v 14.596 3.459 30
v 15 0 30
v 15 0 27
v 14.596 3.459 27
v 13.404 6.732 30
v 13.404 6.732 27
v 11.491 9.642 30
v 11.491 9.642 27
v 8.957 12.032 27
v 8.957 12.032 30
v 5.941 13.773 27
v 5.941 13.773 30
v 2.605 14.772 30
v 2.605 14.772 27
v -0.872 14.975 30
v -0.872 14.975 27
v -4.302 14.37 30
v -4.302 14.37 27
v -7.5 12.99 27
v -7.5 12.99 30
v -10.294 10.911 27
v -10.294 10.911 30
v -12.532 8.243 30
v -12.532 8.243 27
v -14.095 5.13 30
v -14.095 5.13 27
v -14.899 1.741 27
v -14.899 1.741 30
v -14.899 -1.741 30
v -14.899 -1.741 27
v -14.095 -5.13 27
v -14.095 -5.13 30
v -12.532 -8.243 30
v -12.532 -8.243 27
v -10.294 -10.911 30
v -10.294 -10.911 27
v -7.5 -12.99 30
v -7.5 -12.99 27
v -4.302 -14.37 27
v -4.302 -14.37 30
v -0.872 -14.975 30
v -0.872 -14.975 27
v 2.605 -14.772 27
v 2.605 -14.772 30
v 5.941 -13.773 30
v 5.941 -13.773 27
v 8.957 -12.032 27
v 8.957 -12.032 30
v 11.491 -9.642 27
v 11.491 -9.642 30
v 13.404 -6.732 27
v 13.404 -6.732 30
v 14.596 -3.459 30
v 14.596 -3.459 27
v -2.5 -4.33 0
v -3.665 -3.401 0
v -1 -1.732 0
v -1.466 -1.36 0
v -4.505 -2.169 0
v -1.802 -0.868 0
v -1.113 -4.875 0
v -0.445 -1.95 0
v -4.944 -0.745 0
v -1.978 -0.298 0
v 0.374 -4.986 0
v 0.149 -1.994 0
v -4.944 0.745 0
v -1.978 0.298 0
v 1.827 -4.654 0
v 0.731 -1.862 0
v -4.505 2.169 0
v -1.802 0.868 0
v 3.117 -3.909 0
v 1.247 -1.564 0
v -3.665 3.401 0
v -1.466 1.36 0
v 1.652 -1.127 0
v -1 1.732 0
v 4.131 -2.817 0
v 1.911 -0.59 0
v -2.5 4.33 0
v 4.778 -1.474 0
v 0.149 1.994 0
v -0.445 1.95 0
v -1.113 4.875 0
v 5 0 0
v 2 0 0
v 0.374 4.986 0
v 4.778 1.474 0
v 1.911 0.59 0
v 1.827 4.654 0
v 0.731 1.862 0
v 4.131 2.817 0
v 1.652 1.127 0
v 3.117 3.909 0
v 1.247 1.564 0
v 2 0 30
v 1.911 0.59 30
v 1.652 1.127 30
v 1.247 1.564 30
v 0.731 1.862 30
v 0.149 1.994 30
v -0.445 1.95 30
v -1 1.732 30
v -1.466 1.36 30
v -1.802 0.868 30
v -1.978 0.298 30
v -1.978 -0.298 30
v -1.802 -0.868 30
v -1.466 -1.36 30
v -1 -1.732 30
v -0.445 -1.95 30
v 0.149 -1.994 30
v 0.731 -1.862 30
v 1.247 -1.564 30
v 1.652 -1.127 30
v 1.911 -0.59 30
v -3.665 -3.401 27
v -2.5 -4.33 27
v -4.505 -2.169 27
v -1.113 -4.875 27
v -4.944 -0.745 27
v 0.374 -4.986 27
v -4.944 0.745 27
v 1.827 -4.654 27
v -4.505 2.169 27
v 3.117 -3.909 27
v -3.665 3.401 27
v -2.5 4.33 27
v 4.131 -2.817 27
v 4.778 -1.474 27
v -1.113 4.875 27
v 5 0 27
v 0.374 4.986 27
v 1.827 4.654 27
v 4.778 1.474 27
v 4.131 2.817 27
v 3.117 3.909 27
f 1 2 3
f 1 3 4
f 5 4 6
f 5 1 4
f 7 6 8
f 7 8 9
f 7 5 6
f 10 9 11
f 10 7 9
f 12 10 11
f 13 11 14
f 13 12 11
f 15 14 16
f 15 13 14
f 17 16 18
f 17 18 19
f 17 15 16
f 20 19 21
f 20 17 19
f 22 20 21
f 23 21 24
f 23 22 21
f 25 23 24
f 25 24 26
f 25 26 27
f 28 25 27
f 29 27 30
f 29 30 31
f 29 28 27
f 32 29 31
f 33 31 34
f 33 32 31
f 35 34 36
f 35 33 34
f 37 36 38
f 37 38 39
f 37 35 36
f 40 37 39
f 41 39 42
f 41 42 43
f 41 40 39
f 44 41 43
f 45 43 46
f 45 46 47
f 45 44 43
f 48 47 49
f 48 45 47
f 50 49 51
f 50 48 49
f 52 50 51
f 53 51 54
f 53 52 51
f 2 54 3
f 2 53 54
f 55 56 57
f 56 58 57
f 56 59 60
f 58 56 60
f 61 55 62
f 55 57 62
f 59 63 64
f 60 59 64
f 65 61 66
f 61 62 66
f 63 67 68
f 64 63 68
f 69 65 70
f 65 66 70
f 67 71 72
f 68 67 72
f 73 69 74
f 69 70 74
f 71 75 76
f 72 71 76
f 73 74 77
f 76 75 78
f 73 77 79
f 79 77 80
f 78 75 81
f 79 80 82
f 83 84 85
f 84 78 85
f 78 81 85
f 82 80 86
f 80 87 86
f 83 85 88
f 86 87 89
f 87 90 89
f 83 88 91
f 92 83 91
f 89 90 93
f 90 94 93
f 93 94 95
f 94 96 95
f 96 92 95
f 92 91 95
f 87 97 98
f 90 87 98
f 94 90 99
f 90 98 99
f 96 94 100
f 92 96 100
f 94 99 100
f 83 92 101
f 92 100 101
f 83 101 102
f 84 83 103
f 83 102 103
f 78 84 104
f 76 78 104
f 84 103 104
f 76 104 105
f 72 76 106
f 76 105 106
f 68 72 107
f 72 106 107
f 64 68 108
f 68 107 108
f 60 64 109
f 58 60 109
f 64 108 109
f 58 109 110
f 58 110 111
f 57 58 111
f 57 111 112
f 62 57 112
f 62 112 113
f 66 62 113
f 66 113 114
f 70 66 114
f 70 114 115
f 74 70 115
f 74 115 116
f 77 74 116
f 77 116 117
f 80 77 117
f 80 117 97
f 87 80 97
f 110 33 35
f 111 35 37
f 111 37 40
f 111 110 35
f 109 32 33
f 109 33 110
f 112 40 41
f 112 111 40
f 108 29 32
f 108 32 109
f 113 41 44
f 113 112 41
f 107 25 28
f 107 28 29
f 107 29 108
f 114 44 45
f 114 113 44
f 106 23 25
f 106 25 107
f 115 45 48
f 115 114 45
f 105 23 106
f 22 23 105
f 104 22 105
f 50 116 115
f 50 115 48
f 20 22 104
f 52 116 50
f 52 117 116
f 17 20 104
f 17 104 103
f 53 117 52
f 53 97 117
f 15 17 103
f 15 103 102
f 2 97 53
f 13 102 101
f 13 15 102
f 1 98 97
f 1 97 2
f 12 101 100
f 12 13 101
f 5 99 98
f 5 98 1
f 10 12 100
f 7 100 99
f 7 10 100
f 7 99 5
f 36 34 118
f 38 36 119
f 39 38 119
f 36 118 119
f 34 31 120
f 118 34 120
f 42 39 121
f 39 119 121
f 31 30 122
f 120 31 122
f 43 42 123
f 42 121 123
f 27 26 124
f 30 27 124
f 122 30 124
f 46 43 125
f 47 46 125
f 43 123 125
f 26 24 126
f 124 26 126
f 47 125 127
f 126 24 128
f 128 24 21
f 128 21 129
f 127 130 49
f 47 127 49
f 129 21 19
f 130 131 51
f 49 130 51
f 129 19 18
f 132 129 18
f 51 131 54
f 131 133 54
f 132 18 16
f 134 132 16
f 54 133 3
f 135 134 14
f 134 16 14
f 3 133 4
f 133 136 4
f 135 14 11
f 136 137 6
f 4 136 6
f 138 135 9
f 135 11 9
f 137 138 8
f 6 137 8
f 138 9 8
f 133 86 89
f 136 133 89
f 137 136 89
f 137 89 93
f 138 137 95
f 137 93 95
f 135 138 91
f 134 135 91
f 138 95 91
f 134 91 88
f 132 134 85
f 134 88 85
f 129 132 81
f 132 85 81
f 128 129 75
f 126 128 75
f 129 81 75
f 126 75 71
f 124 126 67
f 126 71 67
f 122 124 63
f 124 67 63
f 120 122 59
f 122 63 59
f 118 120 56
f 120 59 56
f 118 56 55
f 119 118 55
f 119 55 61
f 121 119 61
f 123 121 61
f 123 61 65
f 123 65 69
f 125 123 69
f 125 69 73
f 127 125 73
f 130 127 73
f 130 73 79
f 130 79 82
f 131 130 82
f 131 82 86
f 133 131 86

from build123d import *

# Parameters (mm, degrees)
SKETCH1_R           = 5
BOSS_EXTRUDE1_DEPTH = 30
SKETCH2_R           = 2
CUT_EXTRUDE1_DEPTH  = 31
SKETCH4_R           = 15
SKETCH4_R_2         = 5
BOSS_EXTRUDE3_DEPTH = 3


with BuildPart() as part:
    # Sketch1 → Boss-Extrude1 (new body)
    with BuildSketch(Plane.XY):
        Circle(SKETCH1_R)
    extrude(amount=BOSS_EXTRUDE1_DEPTH)

    # Sketch2 → Cut-Extrude1 (cut, through all)
    with BuildSketch(Plane.XY.offset(30)):
        Circle(SKETCH2_R)
    extrude(amount=-CUT_EXTRUDE1_DEPTH, mode=Mode.SUBTRACT)

    # Sketch4 → Boss-Extrude3 (add)
    with BuildSketch(Plane.XY.offset(30)):
        Circle(SKETCH4_R)
        Circle(SKETCH4_R_2, mode=Mode.SUBTRACT)
    extrude(amount=-BOSS_EXTRUDE3_DEPTH)


solid = part.part
